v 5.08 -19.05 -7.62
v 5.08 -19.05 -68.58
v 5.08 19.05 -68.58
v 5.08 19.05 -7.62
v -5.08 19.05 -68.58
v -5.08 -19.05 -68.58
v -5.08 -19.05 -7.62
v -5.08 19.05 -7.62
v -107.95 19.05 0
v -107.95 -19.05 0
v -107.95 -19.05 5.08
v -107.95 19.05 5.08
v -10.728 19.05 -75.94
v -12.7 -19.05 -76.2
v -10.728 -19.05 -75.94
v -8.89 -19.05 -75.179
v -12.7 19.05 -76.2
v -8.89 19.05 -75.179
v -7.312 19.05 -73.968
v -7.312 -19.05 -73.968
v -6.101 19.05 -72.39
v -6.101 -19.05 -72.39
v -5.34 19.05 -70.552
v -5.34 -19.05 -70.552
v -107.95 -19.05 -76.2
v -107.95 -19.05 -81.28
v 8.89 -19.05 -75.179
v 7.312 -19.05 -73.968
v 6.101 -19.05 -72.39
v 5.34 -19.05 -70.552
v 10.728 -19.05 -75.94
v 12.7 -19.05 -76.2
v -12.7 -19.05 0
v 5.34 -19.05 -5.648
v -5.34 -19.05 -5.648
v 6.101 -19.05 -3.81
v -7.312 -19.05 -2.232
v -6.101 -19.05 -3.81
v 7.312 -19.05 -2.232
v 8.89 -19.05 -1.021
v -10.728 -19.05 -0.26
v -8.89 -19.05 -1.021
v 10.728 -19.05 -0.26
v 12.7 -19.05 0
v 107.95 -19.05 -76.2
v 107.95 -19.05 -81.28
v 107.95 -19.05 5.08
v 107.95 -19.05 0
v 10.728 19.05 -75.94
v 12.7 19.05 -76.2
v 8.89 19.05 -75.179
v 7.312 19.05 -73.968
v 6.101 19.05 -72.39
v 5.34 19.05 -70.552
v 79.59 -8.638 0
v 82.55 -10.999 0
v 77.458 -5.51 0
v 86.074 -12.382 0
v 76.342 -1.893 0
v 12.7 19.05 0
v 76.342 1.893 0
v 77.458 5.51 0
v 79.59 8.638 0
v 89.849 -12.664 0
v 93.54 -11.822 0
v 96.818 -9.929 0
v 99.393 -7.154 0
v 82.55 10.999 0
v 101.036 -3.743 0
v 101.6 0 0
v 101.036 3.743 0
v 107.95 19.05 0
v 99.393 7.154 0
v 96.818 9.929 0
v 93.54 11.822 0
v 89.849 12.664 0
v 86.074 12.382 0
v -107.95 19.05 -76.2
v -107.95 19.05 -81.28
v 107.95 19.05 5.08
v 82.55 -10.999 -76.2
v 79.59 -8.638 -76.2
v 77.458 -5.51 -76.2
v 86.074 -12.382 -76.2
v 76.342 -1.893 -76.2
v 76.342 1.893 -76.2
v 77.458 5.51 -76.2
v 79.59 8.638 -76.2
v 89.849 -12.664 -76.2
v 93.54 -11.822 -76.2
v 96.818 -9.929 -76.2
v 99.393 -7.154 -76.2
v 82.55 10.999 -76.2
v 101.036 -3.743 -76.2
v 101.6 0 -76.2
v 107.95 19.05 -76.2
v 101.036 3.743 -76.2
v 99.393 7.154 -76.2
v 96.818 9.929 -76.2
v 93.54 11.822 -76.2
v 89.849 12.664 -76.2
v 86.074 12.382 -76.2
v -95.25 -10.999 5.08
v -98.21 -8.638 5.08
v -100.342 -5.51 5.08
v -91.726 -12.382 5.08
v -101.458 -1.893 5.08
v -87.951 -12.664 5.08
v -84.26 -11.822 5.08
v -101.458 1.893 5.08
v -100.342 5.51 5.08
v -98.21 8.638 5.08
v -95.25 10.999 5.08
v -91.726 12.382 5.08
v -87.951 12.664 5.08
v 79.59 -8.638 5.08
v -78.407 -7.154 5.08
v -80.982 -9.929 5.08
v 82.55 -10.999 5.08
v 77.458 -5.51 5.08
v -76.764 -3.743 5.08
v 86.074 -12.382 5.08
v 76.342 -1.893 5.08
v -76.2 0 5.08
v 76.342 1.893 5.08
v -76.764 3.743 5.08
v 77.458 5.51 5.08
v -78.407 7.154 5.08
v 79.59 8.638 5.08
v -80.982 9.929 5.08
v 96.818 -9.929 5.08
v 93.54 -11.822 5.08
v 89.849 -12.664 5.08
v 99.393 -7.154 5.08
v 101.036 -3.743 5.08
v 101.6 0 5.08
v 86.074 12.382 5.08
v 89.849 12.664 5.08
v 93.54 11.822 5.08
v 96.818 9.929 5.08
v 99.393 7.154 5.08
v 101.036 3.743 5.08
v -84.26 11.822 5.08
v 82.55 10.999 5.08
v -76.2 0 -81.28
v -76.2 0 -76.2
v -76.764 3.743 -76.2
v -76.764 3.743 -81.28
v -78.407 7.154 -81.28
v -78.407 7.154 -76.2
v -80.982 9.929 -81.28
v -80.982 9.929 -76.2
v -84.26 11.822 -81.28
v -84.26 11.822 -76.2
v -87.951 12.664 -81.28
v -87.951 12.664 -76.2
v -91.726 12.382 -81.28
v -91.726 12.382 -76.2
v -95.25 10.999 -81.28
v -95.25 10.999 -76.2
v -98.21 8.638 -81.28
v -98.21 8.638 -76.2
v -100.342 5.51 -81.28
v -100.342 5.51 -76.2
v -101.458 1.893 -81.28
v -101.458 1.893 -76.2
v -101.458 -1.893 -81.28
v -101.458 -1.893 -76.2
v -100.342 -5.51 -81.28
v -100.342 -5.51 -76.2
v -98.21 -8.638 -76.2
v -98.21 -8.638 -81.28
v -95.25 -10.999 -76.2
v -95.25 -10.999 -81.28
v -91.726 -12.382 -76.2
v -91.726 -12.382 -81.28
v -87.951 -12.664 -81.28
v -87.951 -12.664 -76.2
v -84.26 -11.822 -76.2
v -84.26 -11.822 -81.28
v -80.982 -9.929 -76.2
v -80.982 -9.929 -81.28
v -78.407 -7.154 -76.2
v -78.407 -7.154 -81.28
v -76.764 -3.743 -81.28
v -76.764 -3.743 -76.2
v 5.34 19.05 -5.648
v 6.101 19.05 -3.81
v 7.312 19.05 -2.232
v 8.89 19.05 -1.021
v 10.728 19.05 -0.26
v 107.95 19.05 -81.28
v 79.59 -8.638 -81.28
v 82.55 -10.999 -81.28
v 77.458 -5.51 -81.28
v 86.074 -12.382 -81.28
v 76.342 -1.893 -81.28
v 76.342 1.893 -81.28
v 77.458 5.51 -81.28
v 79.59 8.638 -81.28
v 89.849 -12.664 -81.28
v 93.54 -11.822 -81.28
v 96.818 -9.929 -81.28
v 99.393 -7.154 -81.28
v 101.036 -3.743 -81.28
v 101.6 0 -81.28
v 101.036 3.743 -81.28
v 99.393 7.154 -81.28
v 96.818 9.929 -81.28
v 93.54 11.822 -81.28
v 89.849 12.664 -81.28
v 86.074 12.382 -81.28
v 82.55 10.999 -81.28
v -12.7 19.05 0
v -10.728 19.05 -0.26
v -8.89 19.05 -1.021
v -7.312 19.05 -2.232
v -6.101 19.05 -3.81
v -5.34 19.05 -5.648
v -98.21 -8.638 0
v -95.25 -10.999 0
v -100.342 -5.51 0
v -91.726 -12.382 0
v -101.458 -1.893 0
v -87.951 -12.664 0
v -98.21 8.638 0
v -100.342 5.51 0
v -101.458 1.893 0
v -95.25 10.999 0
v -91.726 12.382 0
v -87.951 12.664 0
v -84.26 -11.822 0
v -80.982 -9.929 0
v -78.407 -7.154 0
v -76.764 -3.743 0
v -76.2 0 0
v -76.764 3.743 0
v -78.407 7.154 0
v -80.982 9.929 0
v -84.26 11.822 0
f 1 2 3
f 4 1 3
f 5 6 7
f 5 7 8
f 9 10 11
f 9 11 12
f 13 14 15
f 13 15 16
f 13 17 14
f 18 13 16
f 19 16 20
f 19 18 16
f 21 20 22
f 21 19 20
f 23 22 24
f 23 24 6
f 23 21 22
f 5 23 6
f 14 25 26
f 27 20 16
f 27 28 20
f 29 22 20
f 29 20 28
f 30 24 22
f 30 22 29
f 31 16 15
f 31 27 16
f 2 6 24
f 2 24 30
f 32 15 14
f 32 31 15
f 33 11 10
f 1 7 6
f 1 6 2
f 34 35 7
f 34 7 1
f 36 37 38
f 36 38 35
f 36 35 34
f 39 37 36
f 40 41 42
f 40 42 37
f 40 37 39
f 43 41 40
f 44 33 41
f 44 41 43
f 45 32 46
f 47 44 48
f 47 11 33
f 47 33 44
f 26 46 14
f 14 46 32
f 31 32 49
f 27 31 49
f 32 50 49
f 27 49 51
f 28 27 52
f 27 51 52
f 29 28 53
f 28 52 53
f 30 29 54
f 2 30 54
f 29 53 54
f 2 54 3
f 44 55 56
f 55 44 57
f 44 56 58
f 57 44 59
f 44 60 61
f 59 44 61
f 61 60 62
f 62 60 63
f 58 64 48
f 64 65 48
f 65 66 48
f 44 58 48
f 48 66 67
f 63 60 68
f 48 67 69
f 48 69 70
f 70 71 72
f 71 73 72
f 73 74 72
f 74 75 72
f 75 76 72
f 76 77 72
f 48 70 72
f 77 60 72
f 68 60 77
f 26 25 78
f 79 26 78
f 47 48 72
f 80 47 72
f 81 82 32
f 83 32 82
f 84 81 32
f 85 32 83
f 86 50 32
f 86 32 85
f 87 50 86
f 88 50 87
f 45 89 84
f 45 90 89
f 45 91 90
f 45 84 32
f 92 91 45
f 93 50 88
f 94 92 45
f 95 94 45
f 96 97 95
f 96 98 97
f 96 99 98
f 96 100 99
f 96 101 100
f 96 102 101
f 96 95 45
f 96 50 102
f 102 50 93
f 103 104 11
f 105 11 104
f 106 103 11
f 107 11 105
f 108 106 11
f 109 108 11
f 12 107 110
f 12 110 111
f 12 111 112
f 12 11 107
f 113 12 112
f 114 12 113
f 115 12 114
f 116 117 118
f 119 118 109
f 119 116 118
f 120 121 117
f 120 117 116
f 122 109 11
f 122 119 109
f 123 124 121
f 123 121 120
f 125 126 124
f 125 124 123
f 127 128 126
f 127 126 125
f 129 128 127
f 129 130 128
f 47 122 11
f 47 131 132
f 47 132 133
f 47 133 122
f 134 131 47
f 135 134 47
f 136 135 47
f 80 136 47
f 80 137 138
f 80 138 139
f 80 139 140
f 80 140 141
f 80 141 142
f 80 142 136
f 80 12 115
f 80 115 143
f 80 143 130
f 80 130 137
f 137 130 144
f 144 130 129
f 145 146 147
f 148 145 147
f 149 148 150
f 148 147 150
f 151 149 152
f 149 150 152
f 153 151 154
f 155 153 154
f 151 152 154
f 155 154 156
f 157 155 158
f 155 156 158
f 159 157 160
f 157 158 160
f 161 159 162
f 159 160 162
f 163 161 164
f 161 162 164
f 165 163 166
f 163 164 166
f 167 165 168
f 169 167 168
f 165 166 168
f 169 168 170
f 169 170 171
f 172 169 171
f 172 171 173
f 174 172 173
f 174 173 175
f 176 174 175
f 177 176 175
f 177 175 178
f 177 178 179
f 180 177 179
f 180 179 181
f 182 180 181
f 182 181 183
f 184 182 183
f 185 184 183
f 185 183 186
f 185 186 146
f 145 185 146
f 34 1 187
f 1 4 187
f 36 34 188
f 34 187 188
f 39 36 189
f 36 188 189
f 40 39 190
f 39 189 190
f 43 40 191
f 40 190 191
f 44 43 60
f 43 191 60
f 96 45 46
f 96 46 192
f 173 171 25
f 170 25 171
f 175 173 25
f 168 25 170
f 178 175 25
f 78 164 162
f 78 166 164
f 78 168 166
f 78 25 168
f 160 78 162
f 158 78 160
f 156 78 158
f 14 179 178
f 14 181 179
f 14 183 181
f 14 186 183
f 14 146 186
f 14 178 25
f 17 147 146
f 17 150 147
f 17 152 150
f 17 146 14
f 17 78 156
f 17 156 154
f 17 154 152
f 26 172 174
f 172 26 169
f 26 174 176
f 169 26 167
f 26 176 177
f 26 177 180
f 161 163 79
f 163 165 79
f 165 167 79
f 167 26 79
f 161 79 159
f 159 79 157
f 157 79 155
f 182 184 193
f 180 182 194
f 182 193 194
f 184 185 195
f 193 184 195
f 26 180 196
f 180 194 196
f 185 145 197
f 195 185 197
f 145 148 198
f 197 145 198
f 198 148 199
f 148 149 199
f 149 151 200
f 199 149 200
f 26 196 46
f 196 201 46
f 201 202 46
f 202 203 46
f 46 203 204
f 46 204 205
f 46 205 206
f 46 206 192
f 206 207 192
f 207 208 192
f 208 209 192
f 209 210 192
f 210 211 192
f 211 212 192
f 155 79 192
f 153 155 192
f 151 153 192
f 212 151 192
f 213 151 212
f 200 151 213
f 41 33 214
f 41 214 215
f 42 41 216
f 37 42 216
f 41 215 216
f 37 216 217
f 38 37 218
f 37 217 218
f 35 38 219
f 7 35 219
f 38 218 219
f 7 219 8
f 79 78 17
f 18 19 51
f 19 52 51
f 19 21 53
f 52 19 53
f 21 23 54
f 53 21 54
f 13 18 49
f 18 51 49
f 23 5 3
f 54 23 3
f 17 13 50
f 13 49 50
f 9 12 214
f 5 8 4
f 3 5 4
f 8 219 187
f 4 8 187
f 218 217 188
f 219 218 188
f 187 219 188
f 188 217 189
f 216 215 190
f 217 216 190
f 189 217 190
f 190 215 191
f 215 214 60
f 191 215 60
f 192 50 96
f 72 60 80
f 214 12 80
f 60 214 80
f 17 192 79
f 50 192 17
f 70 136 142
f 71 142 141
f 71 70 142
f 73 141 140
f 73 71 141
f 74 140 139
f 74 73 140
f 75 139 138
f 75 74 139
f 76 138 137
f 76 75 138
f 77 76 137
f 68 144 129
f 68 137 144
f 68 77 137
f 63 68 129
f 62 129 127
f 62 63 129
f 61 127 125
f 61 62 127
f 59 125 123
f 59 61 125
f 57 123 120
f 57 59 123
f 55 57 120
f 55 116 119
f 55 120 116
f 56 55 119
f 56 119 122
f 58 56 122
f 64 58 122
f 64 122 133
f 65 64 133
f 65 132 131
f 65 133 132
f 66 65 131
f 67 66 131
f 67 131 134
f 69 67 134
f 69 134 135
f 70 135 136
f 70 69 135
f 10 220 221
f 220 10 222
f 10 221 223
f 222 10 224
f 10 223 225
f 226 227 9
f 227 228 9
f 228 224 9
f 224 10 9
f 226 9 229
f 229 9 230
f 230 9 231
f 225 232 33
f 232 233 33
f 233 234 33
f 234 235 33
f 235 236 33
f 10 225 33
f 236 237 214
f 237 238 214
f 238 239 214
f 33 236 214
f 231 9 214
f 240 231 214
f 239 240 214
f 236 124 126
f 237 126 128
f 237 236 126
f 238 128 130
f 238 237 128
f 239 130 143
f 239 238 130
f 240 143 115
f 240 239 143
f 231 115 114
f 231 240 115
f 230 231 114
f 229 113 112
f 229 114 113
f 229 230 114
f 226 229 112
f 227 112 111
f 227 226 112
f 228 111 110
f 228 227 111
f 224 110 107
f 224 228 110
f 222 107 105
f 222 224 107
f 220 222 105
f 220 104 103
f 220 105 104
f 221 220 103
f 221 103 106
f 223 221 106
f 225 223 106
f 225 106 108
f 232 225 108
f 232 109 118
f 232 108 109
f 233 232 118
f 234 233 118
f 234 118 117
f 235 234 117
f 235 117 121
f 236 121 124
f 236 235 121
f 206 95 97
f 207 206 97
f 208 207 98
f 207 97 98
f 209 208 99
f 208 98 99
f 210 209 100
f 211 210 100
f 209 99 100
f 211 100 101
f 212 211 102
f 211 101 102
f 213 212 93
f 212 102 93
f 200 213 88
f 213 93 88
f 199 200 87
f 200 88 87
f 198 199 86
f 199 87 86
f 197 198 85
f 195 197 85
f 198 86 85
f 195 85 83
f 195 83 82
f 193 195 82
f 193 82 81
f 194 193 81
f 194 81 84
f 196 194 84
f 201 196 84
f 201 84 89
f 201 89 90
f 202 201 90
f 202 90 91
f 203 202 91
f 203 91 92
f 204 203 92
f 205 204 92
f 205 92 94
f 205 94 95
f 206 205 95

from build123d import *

# Parameters (mm, degrees)
SKETCH1_W           = 215.9
SKETCH1_H           = 38.1
BOSS_EXTRUDE1_DEPTH = 5.08
SKETCH2_R           = 12.7
CUT_EXTRUDE1_DEPTH  = 110.735643252
SKETCH3_W           = 10.16
SKETCH3_H           = 38.1
BOSS_EXTRUDE2_DEPTH = 38.1
FILLET1_R           = 7.62


with BuildPart() as part:
    # Sketch1 → Boss-Extrude1 (new body)
    with BuildSketch(Plane.XY):
        Rectangle(SKETCH1_W, SKETCH1_H)
    boss_extrude1 = extrude(amount=BOSS_EXTRUDE1_DEPTH)

    # Sketch2 → Cut-Extrude1 (cut, through all)
    with BuildSketch(Plane.XY):
        with Locations((-88.9, 0)):
            Circle(SKETCH2_R)
        with Locations((88.9, 0)):
            Circle(SKETCH2_R)
    cut_extrude1 = extrude(amount=CUT_EXTRUDE1_DEPTH, mode=Mode.SUBTRACT)

    # Sketch3 → Boss-Extrude2 (add)
    with BuildSketch(Plane.XY):
        Rectangle(SKETCH3_W, SKETCH3_H)
    boss_extrude2 = extrude(amount=-BOSS_EXTRUDE2_DEPTH)

    # Mirror2: Boss-Extrude2 across plane
    add(boss_extrude2.mirror(Plane(origin=(0, 0, -38.1), x_dir=(1, 0, 0), z_dir=(0, 0, -1))))

    # Mirror3: Boss-Extrude1, Cut-Extrude1 across plane
    add(boss_extrude1.mirror(Plane(origin=(0, 0, -38.1), x_dir=(1, 0, 0), z_dir=(0, 0, -1))))
    add(cut_extrude1.mirror(Plane(origin=(0, 0, -38.1), x_dir=(1, 0, 0), z_dir=(0, 0, -1))), mode=Mode.SUBTRACT)

    # Fillet1
    fillet1_edges = [part.edges().sort_by_distance(p)[0] for p in [
        (5.08, 0, 0),
        (-5.08, 0, 0),
        (5.08, 0, -76.2),
        (-5.08, 0, -76.2),
    ]]
    fillet(fillet1_edges, radius=FILLET1_R)


solid = part.part
